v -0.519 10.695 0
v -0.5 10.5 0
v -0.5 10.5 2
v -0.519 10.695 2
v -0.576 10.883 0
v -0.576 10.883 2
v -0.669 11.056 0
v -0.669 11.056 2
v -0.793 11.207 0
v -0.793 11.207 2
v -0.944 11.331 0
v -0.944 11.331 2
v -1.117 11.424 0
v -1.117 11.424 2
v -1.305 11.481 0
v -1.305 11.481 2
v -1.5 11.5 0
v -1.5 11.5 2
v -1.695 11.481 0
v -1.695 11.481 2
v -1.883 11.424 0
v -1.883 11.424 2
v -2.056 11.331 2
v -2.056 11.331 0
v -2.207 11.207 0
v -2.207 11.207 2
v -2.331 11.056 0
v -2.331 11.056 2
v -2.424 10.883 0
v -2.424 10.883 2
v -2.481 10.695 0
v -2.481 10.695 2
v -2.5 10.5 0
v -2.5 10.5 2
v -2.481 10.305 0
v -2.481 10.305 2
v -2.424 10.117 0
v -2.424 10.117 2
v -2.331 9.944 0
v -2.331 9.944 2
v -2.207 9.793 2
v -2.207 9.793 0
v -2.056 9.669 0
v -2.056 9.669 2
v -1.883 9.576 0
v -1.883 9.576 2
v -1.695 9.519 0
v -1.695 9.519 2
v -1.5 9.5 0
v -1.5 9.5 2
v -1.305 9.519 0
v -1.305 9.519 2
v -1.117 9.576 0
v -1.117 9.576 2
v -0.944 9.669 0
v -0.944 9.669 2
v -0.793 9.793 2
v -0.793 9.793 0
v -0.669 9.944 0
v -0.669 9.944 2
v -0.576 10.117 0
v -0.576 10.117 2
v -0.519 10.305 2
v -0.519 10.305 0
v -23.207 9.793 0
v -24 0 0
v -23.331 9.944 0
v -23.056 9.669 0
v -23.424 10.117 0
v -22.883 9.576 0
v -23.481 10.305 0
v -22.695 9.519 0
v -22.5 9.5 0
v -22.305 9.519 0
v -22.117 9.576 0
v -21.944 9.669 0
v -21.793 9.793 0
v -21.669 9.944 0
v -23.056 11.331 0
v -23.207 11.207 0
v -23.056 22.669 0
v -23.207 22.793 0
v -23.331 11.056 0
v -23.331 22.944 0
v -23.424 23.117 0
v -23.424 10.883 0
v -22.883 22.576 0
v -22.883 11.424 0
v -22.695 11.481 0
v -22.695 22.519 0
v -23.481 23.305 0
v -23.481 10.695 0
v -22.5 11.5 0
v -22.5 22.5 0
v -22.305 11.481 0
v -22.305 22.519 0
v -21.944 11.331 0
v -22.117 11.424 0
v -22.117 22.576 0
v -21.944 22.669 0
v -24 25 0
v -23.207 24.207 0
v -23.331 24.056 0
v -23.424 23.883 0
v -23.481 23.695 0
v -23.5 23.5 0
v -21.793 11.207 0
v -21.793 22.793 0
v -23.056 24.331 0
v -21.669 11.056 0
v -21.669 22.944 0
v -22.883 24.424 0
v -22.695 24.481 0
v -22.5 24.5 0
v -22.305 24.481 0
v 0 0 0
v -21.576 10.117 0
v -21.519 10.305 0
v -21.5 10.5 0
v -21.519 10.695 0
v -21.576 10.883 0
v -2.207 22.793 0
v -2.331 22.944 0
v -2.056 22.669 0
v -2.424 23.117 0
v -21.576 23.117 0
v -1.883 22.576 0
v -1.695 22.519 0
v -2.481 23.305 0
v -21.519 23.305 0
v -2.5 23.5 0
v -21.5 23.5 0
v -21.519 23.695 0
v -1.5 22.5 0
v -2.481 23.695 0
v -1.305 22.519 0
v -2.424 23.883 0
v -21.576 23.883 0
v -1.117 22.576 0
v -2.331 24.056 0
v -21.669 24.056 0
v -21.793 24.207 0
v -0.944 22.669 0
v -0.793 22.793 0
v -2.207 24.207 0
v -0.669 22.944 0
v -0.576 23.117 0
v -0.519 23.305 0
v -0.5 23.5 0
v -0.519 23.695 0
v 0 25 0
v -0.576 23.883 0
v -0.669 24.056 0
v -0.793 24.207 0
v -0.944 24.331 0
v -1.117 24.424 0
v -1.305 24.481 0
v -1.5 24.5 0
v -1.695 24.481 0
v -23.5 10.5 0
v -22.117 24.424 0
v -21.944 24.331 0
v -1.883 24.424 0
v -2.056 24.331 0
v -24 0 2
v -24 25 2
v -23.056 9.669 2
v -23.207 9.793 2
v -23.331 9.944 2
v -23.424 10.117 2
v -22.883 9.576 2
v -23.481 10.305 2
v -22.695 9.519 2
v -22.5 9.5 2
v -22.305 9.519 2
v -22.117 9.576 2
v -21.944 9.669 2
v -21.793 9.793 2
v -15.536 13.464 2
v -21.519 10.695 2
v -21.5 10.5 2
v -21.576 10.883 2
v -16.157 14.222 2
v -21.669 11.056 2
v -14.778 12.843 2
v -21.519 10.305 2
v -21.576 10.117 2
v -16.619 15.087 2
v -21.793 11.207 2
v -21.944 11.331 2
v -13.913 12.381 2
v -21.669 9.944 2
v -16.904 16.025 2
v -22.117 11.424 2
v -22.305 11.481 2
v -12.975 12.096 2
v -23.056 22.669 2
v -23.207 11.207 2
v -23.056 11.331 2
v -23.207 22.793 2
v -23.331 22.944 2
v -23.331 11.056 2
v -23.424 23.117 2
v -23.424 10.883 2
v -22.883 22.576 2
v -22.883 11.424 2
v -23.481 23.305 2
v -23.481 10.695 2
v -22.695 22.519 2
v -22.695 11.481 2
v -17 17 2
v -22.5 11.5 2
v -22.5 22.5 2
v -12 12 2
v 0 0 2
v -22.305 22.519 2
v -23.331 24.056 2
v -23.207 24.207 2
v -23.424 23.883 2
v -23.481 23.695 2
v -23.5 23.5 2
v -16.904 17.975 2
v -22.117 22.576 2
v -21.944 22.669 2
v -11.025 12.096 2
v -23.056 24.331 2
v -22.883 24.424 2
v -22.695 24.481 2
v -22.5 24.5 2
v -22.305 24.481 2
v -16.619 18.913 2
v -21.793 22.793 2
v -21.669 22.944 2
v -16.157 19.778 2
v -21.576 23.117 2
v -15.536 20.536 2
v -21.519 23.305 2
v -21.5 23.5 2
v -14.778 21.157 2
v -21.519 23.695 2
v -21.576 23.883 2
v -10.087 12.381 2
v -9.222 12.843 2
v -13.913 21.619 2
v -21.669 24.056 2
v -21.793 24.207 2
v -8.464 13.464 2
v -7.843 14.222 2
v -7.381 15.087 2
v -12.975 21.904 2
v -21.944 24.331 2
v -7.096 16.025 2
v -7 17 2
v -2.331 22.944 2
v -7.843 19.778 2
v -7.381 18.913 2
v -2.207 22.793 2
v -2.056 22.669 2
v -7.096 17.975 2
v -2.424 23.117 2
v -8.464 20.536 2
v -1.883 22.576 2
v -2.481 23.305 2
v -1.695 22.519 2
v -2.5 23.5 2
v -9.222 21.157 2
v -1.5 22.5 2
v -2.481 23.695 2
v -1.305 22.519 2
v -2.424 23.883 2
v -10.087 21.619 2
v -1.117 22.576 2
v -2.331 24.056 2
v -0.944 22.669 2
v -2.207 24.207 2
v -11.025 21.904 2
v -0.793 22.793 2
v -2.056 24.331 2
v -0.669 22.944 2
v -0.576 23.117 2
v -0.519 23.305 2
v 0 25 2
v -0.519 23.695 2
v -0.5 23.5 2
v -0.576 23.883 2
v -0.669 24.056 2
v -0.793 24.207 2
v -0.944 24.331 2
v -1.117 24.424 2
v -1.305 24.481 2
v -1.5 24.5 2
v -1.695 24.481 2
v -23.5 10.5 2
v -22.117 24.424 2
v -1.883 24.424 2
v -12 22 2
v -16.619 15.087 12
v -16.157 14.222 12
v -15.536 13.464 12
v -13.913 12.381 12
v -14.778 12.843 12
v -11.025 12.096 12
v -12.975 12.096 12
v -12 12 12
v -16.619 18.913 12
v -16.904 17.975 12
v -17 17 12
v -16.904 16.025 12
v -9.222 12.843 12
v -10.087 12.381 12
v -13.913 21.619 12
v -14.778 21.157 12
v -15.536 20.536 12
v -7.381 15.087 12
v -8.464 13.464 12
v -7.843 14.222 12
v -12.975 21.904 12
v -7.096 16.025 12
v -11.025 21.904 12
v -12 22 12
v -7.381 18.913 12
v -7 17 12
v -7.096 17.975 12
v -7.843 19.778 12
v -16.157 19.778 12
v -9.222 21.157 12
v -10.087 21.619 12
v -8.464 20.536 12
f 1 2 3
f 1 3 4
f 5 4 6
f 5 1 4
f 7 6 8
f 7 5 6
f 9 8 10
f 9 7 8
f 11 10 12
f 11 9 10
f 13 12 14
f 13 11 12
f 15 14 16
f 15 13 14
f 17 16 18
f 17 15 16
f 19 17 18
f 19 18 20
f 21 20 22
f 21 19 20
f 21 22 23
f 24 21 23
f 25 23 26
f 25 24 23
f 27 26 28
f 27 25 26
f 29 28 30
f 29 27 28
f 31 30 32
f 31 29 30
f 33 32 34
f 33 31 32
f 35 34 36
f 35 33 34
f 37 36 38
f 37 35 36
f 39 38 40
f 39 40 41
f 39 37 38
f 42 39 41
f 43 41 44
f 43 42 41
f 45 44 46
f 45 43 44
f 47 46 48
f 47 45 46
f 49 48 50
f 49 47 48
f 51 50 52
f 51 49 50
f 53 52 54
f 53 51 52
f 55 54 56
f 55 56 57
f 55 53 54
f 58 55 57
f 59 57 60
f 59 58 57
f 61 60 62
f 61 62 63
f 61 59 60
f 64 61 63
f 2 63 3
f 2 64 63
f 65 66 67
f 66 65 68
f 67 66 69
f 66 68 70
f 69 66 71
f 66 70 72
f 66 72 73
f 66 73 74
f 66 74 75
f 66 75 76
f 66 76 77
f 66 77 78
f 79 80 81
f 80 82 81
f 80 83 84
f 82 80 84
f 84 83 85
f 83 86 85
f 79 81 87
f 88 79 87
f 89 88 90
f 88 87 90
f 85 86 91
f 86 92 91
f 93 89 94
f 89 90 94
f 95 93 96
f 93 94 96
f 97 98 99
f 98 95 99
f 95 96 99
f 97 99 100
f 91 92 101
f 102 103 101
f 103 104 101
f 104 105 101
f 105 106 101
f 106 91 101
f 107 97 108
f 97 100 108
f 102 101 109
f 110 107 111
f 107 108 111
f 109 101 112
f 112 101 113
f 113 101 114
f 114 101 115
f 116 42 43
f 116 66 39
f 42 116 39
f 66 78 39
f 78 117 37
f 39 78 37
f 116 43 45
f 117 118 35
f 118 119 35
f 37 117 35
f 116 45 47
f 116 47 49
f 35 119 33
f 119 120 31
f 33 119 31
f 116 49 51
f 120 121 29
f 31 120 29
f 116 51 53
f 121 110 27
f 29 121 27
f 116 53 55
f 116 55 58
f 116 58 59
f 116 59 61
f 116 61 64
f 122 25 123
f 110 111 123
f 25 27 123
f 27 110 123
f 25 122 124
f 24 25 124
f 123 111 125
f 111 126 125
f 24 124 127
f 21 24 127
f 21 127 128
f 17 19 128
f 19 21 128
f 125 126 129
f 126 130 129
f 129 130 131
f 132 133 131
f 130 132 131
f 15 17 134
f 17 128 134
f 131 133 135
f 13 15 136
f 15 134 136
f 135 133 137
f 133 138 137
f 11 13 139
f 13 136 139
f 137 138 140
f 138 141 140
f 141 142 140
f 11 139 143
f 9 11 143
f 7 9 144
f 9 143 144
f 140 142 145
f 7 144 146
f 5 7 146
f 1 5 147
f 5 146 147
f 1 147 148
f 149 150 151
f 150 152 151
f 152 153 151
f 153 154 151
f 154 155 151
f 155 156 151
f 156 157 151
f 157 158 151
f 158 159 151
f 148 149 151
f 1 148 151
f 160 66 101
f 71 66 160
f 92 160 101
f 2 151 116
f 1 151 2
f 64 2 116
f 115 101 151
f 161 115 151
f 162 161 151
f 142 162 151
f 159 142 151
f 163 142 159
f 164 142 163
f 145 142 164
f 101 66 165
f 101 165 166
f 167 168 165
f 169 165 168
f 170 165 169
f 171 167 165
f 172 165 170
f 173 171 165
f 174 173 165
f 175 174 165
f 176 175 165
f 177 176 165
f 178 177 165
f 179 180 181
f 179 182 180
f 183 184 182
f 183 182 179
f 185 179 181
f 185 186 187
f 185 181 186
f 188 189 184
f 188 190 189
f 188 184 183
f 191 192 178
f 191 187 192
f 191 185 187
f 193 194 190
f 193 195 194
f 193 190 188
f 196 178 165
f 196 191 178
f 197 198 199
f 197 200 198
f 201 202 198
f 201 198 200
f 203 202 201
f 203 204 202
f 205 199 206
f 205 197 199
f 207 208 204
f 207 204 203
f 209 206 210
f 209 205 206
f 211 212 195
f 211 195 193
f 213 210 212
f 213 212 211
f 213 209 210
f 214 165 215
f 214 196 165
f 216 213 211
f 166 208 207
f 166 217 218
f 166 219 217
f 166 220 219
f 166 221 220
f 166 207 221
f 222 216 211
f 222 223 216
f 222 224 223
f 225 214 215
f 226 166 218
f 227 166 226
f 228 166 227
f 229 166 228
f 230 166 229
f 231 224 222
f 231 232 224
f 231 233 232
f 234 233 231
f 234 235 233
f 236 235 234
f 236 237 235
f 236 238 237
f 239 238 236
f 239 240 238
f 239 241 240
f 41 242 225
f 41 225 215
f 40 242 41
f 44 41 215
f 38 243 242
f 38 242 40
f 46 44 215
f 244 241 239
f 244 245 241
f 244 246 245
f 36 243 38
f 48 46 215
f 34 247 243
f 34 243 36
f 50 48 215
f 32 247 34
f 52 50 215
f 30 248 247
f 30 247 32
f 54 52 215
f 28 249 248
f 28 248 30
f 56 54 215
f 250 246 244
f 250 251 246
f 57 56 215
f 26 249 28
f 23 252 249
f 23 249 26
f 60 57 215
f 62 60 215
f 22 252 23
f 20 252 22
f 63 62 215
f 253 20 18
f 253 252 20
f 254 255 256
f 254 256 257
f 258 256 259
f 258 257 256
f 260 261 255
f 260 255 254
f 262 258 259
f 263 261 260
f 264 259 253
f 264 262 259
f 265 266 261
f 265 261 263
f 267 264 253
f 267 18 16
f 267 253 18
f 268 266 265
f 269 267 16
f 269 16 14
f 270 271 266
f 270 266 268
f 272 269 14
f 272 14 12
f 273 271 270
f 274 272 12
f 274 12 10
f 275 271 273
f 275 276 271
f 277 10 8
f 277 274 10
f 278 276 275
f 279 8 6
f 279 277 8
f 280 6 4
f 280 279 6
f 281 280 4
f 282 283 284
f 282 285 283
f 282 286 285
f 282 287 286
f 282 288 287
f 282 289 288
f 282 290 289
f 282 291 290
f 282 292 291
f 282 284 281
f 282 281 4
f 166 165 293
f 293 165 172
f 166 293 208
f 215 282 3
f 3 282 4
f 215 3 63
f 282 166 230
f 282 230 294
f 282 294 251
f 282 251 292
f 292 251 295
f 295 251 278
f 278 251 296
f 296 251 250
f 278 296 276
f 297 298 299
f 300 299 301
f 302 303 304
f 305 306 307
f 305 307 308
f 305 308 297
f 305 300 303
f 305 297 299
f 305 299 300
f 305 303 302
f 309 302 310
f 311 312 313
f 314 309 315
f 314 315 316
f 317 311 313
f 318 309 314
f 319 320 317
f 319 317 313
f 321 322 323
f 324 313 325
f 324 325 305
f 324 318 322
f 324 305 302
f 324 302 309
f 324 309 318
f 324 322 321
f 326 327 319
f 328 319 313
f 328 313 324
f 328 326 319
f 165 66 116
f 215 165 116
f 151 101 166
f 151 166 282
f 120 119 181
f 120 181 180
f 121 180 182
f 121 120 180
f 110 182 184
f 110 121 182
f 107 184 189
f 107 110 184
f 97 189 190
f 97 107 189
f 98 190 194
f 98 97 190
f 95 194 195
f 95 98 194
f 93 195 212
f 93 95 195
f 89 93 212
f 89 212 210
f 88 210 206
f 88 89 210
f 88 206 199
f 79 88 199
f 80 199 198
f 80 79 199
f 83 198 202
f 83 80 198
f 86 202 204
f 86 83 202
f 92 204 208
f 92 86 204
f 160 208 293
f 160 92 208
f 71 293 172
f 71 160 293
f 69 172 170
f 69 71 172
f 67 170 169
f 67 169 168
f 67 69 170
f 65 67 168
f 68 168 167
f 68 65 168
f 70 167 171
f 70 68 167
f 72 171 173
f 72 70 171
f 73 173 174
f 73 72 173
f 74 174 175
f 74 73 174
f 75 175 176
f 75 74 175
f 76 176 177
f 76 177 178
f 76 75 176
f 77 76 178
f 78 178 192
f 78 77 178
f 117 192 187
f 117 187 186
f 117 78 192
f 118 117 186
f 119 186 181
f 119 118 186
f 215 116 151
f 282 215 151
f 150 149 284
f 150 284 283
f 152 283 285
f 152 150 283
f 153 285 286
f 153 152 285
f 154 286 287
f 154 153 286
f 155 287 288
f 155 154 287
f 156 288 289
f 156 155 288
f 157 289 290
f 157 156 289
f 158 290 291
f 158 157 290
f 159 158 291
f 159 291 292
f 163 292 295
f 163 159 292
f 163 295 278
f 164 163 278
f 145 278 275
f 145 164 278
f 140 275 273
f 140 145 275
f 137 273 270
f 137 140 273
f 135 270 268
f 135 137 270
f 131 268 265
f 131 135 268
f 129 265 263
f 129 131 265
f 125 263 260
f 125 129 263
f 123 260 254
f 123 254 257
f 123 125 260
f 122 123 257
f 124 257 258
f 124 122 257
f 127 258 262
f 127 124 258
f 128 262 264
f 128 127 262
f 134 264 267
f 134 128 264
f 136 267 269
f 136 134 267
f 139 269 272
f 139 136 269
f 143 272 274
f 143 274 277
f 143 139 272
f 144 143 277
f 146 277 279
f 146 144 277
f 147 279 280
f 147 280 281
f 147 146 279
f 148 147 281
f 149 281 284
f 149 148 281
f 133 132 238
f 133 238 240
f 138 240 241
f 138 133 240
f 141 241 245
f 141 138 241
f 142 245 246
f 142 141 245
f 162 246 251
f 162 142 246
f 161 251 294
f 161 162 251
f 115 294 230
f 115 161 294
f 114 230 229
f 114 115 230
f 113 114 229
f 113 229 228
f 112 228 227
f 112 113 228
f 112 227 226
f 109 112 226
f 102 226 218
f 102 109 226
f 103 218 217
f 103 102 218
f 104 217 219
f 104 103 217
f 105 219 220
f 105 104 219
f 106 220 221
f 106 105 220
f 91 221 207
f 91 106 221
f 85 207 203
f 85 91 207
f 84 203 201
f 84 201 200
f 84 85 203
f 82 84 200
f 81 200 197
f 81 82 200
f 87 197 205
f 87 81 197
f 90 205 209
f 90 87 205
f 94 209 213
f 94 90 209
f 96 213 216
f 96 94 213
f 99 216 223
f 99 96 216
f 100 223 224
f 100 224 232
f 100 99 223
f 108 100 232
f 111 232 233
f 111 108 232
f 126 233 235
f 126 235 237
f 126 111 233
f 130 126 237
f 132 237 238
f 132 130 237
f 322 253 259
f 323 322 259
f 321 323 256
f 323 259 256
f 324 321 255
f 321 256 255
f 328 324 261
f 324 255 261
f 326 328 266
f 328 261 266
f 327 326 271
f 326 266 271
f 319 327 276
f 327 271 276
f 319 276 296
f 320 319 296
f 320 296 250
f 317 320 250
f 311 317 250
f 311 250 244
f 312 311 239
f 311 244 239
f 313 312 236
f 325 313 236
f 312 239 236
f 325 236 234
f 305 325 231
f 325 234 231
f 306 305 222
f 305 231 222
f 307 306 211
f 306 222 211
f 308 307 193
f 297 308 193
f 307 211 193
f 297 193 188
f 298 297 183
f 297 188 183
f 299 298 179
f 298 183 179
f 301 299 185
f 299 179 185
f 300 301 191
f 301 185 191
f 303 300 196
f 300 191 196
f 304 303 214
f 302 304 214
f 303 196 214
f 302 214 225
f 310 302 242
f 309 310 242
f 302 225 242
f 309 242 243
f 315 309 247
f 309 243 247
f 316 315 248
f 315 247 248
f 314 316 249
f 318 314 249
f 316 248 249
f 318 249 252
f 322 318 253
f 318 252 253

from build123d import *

# Parameters (mm, degrees)
SKETCH_1_W      = 24
SKETCH_1_H      = 25
SKETCH_1_R      = 1
EXTRUDE_1_DEPTH = 2
SKETCH_2_R      = 5
EXTRUDE_2_DEPTH = 10


with BuildPart() as part:
    # 草图1 → 凸台-拉伸1 (new body)
    with BuildSketch(Plane.XY):
        with Locations((-12, 12.5)):
            Rectangle(SKETCH_1_W, SKETCH_1_H)
        with Locations((-22.5, 23.5)):
            Circle(SKETCH_1_R, mode=Mode.SUBTRACT)
        with Locations((-22.5, 10.5)):
            Circle(SKETCH_1_R, mode=Mode.SUBTRACT)
        with Locations((-1.5, 10.5)):
            Circle(SKETCH_1_R, mode=Mode.SUBTRACT)
        with Locations((-1.5, 23.5)):
            Circle(SKETCH_1_R, mode=Mode.SUBTRACT)
    extrude(amount=EXTRUDE_1_DEPTH)

    # 草图2 → 凸台-拉伸2 (add)
    with BuildSketch(Plane.XY.offset(2)):
        with Locations((-12, 17)):
            Circle(SKETCH_2_R)
    extrude(amount=EXTRUDE_2_DEPTH)


solid = part.part
